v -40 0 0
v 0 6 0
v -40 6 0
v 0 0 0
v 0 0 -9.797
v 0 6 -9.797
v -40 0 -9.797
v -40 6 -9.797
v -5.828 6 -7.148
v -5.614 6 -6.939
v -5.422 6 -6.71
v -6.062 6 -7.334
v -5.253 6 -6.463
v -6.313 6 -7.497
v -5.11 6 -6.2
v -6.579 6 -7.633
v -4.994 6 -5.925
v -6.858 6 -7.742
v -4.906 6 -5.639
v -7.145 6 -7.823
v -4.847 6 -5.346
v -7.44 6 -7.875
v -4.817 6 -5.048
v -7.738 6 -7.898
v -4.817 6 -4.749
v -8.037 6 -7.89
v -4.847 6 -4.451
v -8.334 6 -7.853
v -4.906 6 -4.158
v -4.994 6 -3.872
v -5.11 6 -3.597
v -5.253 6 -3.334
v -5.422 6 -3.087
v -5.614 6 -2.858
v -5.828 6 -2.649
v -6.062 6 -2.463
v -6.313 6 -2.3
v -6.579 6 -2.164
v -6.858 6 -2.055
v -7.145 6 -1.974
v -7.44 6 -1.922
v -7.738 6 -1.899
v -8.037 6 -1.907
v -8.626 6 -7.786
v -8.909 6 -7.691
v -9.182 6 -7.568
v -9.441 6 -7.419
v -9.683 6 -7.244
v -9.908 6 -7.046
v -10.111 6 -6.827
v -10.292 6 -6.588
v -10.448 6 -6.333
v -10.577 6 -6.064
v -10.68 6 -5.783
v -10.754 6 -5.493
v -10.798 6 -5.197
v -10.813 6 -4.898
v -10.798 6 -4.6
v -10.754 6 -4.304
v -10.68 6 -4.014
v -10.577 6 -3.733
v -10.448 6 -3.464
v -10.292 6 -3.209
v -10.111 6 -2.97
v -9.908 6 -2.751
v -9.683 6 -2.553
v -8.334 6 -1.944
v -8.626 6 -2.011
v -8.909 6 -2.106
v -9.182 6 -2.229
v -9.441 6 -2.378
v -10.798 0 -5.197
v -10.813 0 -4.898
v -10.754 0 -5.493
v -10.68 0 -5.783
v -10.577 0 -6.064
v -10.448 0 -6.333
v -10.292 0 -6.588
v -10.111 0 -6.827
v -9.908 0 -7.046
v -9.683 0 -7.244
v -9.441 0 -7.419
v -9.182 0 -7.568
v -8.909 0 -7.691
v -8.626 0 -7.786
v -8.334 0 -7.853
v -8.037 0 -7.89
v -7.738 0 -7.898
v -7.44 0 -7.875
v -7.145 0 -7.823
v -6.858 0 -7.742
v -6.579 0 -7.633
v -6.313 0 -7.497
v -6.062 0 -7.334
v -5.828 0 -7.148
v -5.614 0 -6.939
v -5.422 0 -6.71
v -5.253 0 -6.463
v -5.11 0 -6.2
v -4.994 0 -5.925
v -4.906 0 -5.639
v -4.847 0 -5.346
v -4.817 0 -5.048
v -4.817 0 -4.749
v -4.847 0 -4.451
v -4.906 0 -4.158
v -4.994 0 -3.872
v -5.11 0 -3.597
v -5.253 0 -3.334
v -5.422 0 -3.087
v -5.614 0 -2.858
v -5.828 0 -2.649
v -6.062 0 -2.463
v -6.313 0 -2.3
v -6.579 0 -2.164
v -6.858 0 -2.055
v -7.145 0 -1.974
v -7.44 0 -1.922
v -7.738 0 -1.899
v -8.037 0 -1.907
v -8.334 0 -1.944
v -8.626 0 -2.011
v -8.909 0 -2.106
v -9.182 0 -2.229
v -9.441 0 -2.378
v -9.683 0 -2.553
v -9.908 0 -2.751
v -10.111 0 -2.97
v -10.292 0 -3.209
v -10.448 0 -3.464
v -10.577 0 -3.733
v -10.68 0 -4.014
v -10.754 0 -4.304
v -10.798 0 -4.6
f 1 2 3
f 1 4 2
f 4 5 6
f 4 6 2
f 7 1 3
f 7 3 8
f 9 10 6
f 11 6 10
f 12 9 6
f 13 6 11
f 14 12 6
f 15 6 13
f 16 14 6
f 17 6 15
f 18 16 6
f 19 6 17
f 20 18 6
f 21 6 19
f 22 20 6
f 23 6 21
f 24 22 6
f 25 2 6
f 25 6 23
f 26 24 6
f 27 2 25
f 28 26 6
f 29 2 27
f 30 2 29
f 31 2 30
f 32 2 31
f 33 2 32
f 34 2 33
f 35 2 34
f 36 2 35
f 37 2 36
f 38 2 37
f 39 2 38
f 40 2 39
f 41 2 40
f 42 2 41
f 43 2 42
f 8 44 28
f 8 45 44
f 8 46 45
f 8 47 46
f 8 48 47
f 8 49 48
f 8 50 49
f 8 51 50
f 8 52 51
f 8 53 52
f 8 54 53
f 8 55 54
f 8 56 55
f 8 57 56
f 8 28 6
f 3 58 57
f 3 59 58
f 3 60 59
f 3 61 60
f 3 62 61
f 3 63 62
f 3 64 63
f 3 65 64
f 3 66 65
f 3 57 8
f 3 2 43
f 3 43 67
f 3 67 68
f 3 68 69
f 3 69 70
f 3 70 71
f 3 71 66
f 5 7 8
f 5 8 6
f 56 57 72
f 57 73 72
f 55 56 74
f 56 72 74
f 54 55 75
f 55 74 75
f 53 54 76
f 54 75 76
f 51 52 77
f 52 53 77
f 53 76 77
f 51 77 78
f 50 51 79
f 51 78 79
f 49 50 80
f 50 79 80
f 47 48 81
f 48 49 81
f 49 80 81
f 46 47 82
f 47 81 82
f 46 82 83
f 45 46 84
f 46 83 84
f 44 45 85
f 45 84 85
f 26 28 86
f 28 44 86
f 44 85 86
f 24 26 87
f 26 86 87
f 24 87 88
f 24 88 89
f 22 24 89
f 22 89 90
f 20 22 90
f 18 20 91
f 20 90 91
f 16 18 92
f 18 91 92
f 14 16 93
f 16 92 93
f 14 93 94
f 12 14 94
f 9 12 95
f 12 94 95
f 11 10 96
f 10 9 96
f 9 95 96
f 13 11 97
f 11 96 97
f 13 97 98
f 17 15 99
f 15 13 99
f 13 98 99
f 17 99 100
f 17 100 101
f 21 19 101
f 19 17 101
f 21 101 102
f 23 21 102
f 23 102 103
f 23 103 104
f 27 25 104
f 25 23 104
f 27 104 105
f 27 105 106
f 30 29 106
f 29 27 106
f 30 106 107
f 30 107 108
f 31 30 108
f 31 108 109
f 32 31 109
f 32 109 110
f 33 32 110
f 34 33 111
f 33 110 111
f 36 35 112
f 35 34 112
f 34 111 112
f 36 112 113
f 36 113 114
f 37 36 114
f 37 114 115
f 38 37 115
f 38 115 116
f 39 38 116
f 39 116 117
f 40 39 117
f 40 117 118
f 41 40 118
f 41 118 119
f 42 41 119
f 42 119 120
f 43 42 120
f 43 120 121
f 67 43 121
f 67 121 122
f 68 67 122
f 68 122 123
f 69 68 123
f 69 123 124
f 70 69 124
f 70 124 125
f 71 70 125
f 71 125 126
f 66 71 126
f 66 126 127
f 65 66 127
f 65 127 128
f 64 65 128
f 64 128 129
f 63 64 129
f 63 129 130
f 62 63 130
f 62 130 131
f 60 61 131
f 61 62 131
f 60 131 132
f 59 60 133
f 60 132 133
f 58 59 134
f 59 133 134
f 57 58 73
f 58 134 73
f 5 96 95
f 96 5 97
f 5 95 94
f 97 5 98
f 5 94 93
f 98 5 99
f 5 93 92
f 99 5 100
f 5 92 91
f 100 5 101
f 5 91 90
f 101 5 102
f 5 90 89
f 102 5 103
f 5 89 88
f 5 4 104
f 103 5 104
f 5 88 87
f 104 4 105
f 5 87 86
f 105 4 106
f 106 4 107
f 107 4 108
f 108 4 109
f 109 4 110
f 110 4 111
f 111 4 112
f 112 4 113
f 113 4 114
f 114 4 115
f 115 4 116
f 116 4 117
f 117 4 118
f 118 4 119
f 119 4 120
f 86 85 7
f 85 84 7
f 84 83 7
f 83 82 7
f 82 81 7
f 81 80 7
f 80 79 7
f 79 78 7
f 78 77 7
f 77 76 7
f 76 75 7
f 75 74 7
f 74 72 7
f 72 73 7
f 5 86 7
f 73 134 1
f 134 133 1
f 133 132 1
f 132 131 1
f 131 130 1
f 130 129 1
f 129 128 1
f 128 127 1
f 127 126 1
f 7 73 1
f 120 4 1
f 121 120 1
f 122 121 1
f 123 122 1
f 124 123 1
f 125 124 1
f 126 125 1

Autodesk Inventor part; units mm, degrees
ref_plane "YZ Plane" through (0, 0, 0) normal (1, 0, 0) x (0, 1, 0)
ref_plane "XZ Plane" through (0, 0, 0) normal (0, 1, 0) x (-1, 0, 0)
ref_plane "XY Plane" through (0, 0, 0) normal (0, 0, 1) x (1, 0, 0)
sketch "Sketch1" plane through (0, 0, 0) normal (0, 1, 0) x (-1, 0, 0)
  line L0 (0, 0) -> (40, 0)
  line L1 (40, 0) -> (40, -9.797)
  line L2 (40, -9.797) -> (0, -9.797)
  line L3 (0, -9.797) -> (0, 0)
  circle A0 centre (7.813, -4.8985) radius 3
  dimension "d1" = 40
  dimension "d3" = 6
extrude "Extrusion1" add sketch "Sketch1" along normal blind 6
equation "\"BendRadius\" = Thickness"
equation "\"BendReliefWidth\" = Thickness"
equation "\"BendReliefDepth\" = 0.5 * Thickness"
equation "\"CornerReliefSize\" = 4 * Thickness"
equation "\"MinimumRemnant\" = 2 * Thickness"
equation "\"TransitionRadius\" = BendRadius"
equation "\"JacobiRadiusSize\" = BendRadius"
equation "\"GapSize\" = Thickness"
equation "\"Thickness\" = 0.5"
